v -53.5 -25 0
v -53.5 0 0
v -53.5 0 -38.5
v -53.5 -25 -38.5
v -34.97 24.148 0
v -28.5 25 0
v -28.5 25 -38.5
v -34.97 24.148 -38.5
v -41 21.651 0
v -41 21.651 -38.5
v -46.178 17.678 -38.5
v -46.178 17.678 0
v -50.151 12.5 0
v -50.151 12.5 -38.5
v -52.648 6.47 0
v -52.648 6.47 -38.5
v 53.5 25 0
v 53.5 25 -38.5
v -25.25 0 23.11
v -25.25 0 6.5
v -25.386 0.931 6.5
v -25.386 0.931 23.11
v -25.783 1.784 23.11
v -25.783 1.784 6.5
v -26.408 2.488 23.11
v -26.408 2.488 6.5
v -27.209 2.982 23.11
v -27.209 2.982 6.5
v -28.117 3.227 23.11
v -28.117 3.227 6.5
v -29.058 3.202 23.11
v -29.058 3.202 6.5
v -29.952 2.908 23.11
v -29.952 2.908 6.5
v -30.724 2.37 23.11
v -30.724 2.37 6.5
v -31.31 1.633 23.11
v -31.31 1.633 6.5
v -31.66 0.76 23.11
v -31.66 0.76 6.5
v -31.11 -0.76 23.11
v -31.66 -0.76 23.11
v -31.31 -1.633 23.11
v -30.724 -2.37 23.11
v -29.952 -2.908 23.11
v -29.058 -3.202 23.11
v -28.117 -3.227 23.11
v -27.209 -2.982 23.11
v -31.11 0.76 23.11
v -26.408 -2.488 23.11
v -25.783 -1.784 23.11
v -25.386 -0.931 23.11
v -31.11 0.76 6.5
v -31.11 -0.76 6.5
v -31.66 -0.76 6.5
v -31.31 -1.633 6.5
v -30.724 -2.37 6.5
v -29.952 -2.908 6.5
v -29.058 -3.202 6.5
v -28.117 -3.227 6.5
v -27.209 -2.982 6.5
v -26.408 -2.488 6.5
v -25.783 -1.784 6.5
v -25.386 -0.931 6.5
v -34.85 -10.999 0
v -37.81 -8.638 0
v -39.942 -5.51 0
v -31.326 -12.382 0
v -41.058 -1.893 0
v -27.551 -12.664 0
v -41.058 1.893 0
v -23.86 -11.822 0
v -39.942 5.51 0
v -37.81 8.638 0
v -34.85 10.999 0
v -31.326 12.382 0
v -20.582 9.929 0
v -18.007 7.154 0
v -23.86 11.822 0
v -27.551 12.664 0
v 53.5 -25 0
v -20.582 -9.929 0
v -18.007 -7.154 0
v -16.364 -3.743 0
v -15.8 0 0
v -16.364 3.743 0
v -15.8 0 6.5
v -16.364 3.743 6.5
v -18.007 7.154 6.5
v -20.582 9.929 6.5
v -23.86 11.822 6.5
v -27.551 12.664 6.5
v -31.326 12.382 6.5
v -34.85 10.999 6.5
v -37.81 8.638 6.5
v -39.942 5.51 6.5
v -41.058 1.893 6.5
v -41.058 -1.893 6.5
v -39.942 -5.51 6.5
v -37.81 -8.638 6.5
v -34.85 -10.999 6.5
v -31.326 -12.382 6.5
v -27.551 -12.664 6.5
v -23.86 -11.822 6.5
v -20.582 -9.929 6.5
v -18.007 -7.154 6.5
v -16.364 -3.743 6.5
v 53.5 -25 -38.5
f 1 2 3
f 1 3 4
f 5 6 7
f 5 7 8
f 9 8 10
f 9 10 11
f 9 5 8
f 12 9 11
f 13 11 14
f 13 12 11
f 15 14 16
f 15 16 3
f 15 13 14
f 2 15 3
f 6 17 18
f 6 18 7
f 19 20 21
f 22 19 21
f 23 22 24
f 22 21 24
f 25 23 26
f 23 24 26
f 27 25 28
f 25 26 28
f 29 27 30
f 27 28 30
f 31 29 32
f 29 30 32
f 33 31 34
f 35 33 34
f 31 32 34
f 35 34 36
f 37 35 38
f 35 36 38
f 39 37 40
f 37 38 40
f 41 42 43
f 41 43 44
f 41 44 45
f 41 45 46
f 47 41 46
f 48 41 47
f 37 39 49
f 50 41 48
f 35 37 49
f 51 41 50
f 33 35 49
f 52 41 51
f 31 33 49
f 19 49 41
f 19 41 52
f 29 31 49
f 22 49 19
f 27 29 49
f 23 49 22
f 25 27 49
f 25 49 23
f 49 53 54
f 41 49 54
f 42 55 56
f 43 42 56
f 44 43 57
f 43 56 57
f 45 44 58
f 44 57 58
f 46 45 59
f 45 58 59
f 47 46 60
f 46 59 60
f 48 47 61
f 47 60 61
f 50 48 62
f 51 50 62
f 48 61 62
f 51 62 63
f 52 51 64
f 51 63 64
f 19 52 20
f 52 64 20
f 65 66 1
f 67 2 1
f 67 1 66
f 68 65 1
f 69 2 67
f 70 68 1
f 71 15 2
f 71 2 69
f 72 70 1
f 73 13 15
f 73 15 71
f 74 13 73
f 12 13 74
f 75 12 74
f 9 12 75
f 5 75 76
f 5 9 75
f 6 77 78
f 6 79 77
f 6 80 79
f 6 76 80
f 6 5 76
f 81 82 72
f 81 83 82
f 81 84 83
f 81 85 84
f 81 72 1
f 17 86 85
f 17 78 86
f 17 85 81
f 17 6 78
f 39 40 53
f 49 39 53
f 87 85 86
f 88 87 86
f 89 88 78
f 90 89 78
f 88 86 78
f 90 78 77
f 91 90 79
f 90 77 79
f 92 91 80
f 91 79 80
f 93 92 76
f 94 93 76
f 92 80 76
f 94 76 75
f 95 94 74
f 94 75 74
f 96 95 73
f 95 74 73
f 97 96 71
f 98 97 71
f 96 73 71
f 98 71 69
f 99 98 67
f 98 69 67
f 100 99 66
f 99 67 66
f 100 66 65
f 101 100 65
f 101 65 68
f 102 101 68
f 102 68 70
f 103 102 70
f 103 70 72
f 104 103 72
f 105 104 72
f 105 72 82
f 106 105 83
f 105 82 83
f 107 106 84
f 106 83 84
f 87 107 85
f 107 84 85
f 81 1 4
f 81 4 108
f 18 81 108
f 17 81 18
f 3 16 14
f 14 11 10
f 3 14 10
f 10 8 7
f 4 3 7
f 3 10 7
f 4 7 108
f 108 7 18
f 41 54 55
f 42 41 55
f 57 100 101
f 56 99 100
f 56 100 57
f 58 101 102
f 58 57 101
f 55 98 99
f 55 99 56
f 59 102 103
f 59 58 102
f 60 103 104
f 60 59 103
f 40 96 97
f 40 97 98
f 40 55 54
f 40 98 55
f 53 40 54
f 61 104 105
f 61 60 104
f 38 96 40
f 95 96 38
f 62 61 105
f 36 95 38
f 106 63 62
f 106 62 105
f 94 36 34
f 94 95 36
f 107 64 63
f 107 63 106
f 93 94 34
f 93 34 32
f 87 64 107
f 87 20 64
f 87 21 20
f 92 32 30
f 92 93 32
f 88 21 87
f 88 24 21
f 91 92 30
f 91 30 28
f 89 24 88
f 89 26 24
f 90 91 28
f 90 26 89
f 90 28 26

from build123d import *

# Parameters (mm, degrees)
F0_R     = 12.7
F1_DEPTH = 38.5
F2_DEPTH = 23.11
F3_DEPTH = 6.5


with BuildPart() as f1:
    # F0 (on Top) → F1 (new body)
    with BuildSketch(Plane.XY):
        with BuildLine():
            Line((53.5, -25), (53.5, 25))
            Line((53.5, 25), (-28.5, 25))
            ThreePointArc((-28.5, 25), (-46.1776695297, 17.6776695297), (-53.5, 0))
            Line((-53.5, 0), (-53.5, -25))
            Line((-53.5, -25), (53.5, -25))
        make_face()
        with Locations((-28.5, 0)):
            Circle(F0_R, mode=Mode.SUBTRACT)
        with Locations((-28.5, 0)):
            Circle(F0_R)
        with BuildLine():
            ThreePointArc((-31.6598892386, 0.76), (-28.117338286, 3.2273936873), (-25.25, 0))
            ThreePointArc((-25.25, 0), (-28.117338286, -3.2273936873), (-31.6598892386, -0.76))
            ThreePointArc((-31.6598892386, -0.76), (-31.75, 0), (-31.6598892386, 0.76))
        make_face(mode=Mode.SUBTRACT)
        with BuildLine():
            ThreePointArc((-31.6598892386, -0.76), (-28.117338286, -3.2273936873), (-25.25, 0))
            ThreePointArc((-25.25, 0), (-28.117338286, 3.2273936873), (-31.6598892386, 0.76))
            Line((-31.6598892386, 0.76), (-31.1098892386, 0.76))
            Line((-31.1098892386, 0.76), (-31.1098892386, -0.76))
            Line((-31.1098892386, -0.76), (-31.6598892386, -0.76))
        make_face()
        with BuildLine():
            Line((-31.1098892386, 0.76), (-31.6598892386, 0.76))
            ThreePointArc((-31.6598892386, 0.76), (-31.75, 0), (-31.6598892386, -0.76))
            Line((-31.6598892386, -0.76), (-31.1098892386, -0.76))
            Line((-31.1098892386, -0.76), (-31.1098892386, 0.76))
        make_face()
    extrude(amount=-F1_DEPTH)

    # F0 (on Top) → F2 (join)
    with BuildSketch(Plane.XY):
        with BuildLine():
            ThreePointArc((-31.6598892386, -0.76), (-28.117338286, -3.2273936873), (-25.25, 0))
            ThreePointArc((-25.25, 0), (-28.117338286, 3.2273936873), (-31.6598892386, 0.76))
            Line((-31.6598892386, 0.76), (-31.1098892386, 0.76))
            Line((-31.1098892386, 0.76), (-31.1098892386, -0.76))
            Line((-31.1098892386, -0.76), (-31.6598892386, -0.76))
        make_face()
    extrude(amount=F2_DEPTH)

    # F0 (on Top) → F3 (join)
    with BuildSketch(Plane.XY):
        with Locations((-28.5, 0)):
            Circle(F0_R)
        with BuildLine():
            ThreePointArc((-31.6598892386, 0.76), (-28.117338286, 3.2273936873), (-25.25, 0))
            ThreePointArc((-25.25, 0), (-28.117338286, -3.2273936873), (-31.6598892386, -0.76))
            ThreePointArc((-31.6598892386, -0.76), (-31.75, 0), (-31.6598892386, 0.76))
        make_face(mode=Mode.SUBTRACT)
        with BuildLine():
            Line((-31.1098892386, 0.76), (-31.6598892386, 0.76))
            ThreePointArc((-31.6598892386, 0.76), (-31.75, 0), (-31.6598892386, -0.76))
            Line((-31.6598892386, -0.76), (-31.1098892386, -0.76))
            Line((-31.1098892386, -0.76), (-31.1098892386, 0.76))
        make_face()
    extrude(amount=F3_DEPTH)


solid = f1.part
